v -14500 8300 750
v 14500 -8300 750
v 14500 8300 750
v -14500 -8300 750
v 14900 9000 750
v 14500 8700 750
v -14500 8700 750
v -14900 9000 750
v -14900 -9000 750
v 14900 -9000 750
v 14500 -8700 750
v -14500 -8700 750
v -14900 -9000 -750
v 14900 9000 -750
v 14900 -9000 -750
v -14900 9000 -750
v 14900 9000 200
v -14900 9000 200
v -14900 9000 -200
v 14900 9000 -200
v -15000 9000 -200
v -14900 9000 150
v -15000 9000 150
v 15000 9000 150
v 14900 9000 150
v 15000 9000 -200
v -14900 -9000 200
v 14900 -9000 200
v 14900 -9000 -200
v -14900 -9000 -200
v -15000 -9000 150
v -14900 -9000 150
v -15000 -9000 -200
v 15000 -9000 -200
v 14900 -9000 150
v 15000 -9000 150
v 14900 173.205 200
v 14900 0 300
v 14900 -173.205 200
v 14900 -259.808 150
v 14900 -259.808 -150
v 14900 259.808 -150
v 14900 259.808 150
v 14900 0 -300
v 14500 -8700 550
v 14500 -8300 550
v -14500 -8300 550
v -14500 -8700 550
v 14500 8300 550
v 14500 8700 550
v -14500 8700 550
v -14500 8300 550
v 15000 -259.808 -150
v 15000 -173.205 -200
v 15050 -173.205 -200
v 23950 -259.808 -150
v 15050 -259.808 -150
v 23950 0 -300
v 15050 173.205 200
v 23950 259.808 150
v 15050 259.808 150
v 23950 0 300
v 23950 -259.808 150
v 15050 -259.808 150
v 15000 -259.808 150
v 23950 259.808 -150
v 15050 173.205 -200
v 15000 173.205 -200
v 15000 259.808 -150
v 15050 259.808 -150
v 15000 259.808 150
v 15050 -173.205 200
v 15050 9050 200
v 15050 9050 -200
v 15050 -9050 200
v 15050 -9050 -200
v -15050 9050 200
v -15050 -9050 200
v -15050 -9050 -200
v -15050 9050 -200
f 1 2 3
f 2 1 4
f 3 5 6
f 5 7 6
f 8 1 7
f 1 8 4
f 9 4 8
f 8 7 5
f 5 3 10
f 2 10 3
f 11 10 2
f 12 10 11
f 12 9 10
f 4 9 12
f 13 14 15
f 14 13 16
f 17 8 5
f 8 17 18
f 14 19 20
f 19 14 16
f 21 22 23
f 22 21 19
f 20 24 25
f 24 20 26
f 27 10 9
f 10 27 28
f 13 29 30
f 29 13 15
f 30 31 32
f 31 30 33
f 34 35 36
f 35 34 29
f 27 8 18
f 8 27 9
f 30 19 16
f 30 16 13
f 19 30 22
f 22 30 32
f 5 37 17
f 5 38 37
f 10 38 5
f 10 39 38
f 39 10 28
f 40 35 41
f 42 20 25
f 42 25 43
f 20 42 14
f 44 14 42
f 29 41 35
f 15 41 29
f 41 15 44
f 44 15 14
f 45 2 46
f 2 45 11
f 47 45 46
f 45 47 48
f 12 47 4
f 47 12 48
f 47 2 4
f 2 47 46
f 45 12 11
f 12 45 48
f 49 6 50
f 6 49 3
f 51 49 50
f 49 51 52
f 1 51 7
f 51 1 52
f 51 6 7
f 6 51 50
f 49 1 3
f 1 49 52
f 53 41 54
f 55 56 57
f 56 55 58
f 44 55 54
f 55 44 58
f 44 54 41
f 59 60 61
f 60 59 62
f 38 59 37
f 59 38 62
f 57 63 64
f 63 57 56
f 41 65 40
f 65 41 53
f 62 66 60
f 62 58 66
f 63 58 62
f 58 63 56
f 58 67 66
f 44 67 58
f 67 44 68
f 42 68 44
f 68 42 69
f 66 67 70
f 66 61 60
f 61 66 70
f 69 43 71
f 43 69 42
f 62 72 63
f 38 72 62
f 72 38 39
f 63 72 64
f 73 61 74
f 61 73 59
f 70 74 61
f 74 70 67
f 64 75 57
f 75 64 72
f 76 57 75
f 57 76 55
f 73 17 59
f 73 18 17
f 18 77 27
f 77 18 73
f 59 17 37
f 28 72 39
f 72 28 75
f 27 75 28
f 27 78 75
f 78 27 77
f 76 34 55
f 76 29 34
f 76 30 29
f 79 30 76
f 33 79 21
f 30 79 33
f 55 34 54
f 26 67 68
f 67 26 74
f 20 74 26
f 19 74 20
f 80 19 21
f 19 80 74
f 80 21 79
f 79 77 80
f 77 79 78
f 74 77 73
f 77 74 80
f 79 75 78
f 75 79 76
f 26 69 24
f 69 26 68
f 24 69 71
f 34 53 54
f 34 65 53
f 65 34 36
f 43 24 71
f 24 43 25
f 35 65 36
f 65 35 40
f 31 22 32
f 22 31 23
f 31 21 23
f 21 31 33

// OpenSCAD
// file: carrier_deck.scad
// =========================================================================
// GRUMMAN-STYLED EMERGENCY INFLATABLE CARRIER - FLATBED FLUSH-DECK PLATFORM
// MANUFACTURER: HUNTINGTON INGALLS / NEWPORT NEWS SHIPBUILDING
// MECHANICAL BLUEPRINT SPECIFICATION: ACCORDION LANDING PLATFORM
// =========================================================================

module carrier_plate_module(length=30000, width=18000, thickness=1500) {
    difference() {
        // Main Flatbed Drop-Stitch Slab Core (No Tower, No Turret Obstructions)
        cube([length, width, thickness], center=true);
        
        // Passive Hinge Clearances for Accordion-Style Stacking
        translate([-length/2, 0, 0])
            cube([200, width+10, thickness+10], center=true);
        translate([length/2, 0, 0])
            cube([200, width+10, thickness+10], center=true);
            
        // Integrated Low-Profile Left/Right Sump Trenches for Bilge Collection
        translate([0, -width/2 + 500, thickness/2 - 100])
            cube([length - 1000, 400, 200], center=true);
        translate([0, width/2 - 500, thickness/2 - 100])
            cube([length - 1000, 400, 200], center=true);
    }
    
    // Huntington Ingalls Gravity-Drop Tongue-and-Groove Passive Interlocks
    translate([length/2 - 50, 0, 0])
        tongue_interlock_joint(width);
}

module tongue_interlock_joint(joint_width) {
    // Solid wedge joint profile that jams locked under gravity drop action
    rotate([0, 90, 0])
        cylinder(h=100, r=300, h=joint_width, center=true, $fn=6);
}

// Render primary operational flatbed segment
carrier_plate_module();
// main file
// =========================================================================
// GRUMMAN-STYLED INFLATABLE CARRIER - PARAMETRIC TOP-LID MODULE
// MANUFACTURER: HUNTINGTON INGALLS / NEWPORT NEWS SHIPBUILDING
// WEATHERPROOF FRAMEWORK CONFIGURATION FOR FLATBED ENCLOSURE
// =========================================================================

include <carrier_deck.scad>

// Drive dimensions via external JSON configuration pipeline
length = 30000;
width = 18000;
thickness = 400; 

module carrier_top_lid_enclosure(l=length, w=width, t=thickness) {
    difference() {
        // Main Weatherproof Protective Shell
        cube([l + 100, w + 100, t], center=true);
        
        // Main Cavity Clearance for Folded Accordion Plates
        translate([0, 0, -50])
            cube([l, w, t], center=true);
    }
    
    // Internal Mounting Bosses for SNAP-CIRCUITS Power Boards
    translate([-l/4, -w/4, -t/2 + 50]) snap_circuit_boss();
    translate([l/4, -w/4, -t/2 + 50])  snap_circuit_boss();
    translate([-l/4, w/4, -t/2 + 50])  snap_circuit_boss();
    translate([l/4, w/4, -t/2 + 50])   snap_circuit_boss();
}

module snap_circuit_boss(boss_radius=150, boss_height=100) {
    // Heavy-duty mounting bosses with individual component Guard Ring spacing
    difference() {
        cylinder(h=boss_height, r=boss_radius, center=true, $fn=32);
        cylinder(h=boss_height + 10, r=boss_radius - 50, center=true, $fn=32);
    }
}

// Instantiate complementary top-lid module
carrier_top_lid_enclosure();
